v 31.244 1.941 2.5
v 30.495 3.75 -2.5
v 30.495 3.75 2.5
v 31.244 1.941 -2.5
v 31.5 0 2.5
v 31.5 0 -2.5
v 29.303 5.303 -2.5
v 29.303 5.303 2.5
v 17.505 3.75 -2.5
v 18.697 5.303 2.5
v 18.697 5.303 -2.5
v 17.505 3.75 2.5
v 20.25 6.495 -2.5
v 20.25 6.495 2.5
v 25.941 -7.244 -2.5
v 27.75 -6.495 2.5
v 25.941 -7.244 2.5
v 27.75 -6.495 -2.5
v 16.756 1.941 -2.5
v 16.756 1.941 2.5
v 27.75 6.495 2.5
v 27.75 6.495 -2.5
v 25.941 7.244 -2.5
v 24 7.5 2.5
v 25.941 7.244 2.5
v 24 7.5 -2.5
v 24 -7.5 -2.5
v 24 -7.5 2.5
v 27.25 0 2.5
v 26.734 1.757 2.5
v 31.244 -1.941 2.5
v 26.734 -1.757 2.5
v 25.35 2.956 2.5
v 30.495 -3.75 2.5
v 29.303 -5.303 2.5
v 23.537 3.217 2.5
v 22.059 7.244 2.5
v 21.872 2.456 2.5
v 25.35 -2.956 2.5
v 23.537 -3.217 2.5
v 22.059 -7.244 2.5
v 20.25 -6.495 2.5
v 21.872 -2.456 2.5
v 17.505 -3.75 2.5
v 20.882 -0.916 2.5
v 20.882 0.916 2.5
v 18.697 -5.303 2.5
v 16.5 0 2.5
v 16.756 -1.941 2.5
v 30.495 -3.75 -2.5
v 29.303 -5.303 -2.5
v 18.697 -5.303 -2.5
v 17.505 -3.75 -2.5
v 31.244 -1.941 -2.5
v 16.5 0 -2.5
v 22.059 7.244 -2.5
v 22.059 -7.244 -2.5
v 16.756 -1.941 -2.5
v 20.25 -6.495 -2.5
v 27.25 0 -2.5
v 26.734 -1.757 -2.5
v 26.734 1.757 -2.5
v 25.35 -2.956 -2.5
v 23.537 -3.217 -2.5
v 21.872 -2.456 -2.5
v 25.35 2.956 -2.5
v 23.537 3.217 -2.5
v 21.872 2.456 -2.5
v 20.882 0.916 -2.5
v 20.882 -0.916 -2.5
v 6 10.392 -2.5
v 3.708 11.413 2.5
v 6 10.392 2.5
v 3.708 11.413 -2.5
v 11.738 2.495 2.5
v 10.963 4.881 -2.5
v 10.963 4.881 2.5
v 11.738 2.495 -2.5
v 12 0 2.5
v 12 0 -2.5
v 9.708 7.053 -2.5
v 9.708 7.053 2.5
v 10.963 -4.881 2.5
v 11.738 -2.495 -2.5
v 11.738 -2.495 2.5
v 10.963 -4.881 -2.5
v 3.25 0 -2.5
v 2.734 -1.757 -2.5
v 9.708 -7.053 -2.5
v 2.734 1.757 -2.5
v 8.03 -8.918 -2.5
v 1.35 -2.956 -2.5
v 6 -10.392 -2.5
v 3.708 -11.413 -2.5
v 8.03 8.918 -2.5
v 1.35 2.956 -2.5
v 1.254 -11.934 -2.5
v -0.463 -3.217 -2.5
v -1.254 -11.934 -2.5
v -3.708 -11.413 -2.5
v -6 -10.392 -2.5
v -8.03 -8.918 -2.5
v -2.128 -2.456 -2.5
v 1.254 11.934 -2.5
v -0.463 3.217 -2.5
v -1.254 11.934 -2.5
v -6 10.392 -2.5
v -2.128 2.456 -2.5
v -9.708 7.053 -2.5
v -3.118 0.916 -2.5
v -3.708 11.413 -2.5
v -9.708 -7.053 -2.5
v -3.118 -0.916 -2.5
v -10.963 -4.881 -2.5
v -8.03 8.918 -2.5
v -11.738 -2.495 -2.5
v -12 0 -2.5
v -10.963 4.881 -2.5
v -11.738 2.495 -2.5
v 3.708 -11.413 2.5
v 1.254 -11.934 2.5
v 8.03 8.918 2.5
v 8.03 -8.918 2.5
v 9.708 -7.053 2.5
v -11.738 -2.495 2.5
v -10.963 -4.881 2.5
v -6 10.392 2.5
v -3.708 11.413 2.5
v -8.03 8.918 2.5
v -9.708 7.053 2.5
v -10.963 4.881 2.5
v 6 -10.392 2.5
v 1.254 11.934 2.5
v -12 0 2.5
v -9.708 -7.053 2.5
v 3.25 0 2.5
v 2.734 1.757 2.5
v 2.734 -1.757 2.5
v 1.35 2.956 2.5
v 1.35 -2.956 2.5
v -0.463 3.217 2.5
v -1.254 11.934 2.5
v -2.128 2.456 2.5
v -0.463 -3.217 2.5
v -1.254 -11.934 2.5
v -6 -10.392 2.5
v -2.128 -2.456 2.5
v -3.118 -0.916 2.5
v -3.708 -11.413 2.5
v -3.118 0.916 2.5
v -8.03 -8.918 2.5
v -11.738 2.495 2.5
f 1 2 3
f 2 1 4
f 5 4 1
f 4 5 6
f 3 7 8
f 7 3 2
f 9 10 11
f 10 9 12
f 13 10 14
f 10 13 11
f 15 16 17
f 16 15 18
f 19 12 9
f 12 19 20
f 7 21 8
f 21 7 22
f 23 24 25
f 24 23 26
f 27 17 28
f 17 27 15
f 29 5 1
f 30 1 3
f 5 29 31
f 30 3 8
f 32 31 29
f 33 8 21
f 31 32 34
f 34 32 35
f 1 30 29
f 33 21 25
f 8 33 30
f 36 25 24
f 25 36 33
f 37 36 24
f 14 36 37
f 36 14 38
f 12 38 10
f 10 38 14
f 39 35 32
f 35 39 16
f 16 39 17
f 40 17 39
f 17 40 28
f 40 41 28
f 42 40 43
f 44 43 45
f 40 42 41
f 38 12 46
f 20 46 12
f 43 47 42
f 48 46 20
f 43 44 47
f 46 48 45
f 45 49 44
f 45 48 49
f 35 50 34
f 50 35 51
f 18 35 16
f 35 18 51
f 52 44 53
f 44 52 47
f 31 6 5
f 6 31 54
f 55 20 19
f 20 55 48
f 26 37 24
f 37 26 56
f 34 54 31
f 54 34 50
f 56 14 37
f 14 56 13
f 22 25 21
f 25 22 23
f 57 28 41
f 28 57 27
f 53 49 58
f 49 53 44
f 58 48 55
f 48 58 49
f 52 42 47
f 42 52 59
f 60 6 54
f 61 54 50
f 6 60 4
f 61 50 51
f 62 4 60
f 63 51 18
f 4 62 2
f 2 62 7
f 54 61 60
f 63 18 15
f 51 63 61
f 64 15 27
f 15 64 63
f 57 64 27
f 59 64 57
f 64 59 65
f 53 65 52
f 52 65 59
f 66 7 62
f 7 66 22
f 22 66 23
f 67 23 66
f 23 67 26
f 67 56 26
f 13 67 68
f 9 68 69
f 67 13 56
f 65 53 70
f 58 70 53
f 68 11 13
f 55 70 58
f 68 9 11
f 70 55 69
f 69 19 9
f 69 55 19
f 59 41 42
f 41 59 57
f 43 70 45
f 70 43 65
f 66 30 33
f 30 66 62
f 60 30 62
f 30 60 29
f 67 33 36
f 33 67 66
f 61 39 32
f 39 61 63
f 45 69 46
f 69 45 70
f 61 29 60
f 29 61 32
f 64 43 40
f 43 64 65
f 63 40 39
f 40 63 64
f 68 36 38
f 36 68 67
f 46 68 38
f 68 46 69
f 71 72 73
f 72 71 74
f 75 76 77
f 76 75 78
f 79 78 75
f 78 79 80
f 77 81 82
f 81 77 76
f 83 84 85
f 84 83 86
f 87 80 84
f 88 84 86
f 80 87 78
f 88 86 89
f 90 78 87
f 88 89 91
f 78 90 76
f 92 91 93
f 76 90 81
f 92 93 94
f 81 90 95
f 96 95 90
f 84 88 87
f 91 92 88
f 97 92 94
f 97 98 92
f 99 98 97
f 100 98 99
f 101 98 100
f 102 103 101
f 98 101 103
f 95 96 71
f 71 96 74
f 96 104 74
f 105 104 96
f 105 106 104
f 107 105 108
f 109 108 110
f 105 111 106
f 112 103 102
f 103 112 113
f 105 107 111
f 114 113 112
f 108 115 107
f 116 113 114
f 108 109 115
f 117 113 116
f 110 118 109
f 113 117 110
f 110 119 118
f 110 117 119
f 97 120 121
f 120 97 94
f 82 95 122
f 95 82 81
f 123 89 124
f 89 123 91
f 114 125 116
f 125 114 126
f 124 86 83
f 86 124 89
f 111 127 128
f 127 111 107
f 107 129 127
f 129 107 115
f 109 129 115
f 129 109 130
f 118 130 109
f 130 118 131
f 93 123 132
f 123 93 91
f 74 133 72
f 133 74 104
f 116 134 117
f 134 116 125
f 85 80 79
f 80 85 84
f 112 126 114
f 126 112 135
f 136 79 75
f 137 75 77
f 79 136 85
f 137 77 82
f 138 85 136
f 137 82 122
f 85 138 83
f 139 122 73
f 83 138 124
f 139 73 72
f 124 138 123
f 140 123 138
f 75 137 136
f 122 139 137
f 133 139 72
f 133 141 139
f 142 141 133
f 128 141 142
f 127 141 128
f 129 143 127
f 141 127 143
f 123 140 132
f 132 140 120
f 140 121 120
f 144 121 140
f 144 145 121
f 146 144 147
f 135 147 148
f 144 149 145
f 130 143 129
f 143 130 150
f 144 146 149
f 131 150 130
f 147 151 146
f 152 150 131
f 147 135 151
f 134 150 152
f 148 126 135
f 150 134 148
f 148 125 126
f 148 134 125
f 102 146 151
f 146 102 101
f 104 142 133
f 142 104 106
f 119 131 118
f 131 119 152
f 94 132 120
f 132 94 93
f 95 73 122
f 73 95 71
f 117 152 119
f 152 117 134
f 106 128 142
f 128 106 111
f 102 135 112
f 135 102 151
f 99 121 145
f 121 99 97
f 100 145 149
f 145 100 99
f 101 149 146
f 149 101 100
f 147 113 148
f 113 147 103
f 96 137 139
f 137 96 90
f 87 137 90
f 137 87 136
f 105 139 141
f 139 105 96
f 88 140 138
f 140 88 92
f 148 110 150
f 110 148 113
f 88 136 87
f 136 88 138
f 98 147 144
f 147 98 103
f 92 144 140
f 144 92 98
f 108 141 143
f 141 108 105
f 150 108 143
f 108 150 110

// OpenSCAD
d_small_nut = 15;
d_big_nut = 24;
h_nut = 5;

translate([d_big_nut,0,0])
nut_small();
nut_big();
module nut_small(){
    difference(){
        
        cylinder(d = d_small_nut, h = h_nut, center=true);
        cylinder(h = 40, d=6.5, center = true);
    }
}

module nut_big(){
    difference(){
        
        cylinder(d = d_big_nut, h = h_nut, center=true);
        cylinder(h = 40, d=6.5, center = true);
    }
}
